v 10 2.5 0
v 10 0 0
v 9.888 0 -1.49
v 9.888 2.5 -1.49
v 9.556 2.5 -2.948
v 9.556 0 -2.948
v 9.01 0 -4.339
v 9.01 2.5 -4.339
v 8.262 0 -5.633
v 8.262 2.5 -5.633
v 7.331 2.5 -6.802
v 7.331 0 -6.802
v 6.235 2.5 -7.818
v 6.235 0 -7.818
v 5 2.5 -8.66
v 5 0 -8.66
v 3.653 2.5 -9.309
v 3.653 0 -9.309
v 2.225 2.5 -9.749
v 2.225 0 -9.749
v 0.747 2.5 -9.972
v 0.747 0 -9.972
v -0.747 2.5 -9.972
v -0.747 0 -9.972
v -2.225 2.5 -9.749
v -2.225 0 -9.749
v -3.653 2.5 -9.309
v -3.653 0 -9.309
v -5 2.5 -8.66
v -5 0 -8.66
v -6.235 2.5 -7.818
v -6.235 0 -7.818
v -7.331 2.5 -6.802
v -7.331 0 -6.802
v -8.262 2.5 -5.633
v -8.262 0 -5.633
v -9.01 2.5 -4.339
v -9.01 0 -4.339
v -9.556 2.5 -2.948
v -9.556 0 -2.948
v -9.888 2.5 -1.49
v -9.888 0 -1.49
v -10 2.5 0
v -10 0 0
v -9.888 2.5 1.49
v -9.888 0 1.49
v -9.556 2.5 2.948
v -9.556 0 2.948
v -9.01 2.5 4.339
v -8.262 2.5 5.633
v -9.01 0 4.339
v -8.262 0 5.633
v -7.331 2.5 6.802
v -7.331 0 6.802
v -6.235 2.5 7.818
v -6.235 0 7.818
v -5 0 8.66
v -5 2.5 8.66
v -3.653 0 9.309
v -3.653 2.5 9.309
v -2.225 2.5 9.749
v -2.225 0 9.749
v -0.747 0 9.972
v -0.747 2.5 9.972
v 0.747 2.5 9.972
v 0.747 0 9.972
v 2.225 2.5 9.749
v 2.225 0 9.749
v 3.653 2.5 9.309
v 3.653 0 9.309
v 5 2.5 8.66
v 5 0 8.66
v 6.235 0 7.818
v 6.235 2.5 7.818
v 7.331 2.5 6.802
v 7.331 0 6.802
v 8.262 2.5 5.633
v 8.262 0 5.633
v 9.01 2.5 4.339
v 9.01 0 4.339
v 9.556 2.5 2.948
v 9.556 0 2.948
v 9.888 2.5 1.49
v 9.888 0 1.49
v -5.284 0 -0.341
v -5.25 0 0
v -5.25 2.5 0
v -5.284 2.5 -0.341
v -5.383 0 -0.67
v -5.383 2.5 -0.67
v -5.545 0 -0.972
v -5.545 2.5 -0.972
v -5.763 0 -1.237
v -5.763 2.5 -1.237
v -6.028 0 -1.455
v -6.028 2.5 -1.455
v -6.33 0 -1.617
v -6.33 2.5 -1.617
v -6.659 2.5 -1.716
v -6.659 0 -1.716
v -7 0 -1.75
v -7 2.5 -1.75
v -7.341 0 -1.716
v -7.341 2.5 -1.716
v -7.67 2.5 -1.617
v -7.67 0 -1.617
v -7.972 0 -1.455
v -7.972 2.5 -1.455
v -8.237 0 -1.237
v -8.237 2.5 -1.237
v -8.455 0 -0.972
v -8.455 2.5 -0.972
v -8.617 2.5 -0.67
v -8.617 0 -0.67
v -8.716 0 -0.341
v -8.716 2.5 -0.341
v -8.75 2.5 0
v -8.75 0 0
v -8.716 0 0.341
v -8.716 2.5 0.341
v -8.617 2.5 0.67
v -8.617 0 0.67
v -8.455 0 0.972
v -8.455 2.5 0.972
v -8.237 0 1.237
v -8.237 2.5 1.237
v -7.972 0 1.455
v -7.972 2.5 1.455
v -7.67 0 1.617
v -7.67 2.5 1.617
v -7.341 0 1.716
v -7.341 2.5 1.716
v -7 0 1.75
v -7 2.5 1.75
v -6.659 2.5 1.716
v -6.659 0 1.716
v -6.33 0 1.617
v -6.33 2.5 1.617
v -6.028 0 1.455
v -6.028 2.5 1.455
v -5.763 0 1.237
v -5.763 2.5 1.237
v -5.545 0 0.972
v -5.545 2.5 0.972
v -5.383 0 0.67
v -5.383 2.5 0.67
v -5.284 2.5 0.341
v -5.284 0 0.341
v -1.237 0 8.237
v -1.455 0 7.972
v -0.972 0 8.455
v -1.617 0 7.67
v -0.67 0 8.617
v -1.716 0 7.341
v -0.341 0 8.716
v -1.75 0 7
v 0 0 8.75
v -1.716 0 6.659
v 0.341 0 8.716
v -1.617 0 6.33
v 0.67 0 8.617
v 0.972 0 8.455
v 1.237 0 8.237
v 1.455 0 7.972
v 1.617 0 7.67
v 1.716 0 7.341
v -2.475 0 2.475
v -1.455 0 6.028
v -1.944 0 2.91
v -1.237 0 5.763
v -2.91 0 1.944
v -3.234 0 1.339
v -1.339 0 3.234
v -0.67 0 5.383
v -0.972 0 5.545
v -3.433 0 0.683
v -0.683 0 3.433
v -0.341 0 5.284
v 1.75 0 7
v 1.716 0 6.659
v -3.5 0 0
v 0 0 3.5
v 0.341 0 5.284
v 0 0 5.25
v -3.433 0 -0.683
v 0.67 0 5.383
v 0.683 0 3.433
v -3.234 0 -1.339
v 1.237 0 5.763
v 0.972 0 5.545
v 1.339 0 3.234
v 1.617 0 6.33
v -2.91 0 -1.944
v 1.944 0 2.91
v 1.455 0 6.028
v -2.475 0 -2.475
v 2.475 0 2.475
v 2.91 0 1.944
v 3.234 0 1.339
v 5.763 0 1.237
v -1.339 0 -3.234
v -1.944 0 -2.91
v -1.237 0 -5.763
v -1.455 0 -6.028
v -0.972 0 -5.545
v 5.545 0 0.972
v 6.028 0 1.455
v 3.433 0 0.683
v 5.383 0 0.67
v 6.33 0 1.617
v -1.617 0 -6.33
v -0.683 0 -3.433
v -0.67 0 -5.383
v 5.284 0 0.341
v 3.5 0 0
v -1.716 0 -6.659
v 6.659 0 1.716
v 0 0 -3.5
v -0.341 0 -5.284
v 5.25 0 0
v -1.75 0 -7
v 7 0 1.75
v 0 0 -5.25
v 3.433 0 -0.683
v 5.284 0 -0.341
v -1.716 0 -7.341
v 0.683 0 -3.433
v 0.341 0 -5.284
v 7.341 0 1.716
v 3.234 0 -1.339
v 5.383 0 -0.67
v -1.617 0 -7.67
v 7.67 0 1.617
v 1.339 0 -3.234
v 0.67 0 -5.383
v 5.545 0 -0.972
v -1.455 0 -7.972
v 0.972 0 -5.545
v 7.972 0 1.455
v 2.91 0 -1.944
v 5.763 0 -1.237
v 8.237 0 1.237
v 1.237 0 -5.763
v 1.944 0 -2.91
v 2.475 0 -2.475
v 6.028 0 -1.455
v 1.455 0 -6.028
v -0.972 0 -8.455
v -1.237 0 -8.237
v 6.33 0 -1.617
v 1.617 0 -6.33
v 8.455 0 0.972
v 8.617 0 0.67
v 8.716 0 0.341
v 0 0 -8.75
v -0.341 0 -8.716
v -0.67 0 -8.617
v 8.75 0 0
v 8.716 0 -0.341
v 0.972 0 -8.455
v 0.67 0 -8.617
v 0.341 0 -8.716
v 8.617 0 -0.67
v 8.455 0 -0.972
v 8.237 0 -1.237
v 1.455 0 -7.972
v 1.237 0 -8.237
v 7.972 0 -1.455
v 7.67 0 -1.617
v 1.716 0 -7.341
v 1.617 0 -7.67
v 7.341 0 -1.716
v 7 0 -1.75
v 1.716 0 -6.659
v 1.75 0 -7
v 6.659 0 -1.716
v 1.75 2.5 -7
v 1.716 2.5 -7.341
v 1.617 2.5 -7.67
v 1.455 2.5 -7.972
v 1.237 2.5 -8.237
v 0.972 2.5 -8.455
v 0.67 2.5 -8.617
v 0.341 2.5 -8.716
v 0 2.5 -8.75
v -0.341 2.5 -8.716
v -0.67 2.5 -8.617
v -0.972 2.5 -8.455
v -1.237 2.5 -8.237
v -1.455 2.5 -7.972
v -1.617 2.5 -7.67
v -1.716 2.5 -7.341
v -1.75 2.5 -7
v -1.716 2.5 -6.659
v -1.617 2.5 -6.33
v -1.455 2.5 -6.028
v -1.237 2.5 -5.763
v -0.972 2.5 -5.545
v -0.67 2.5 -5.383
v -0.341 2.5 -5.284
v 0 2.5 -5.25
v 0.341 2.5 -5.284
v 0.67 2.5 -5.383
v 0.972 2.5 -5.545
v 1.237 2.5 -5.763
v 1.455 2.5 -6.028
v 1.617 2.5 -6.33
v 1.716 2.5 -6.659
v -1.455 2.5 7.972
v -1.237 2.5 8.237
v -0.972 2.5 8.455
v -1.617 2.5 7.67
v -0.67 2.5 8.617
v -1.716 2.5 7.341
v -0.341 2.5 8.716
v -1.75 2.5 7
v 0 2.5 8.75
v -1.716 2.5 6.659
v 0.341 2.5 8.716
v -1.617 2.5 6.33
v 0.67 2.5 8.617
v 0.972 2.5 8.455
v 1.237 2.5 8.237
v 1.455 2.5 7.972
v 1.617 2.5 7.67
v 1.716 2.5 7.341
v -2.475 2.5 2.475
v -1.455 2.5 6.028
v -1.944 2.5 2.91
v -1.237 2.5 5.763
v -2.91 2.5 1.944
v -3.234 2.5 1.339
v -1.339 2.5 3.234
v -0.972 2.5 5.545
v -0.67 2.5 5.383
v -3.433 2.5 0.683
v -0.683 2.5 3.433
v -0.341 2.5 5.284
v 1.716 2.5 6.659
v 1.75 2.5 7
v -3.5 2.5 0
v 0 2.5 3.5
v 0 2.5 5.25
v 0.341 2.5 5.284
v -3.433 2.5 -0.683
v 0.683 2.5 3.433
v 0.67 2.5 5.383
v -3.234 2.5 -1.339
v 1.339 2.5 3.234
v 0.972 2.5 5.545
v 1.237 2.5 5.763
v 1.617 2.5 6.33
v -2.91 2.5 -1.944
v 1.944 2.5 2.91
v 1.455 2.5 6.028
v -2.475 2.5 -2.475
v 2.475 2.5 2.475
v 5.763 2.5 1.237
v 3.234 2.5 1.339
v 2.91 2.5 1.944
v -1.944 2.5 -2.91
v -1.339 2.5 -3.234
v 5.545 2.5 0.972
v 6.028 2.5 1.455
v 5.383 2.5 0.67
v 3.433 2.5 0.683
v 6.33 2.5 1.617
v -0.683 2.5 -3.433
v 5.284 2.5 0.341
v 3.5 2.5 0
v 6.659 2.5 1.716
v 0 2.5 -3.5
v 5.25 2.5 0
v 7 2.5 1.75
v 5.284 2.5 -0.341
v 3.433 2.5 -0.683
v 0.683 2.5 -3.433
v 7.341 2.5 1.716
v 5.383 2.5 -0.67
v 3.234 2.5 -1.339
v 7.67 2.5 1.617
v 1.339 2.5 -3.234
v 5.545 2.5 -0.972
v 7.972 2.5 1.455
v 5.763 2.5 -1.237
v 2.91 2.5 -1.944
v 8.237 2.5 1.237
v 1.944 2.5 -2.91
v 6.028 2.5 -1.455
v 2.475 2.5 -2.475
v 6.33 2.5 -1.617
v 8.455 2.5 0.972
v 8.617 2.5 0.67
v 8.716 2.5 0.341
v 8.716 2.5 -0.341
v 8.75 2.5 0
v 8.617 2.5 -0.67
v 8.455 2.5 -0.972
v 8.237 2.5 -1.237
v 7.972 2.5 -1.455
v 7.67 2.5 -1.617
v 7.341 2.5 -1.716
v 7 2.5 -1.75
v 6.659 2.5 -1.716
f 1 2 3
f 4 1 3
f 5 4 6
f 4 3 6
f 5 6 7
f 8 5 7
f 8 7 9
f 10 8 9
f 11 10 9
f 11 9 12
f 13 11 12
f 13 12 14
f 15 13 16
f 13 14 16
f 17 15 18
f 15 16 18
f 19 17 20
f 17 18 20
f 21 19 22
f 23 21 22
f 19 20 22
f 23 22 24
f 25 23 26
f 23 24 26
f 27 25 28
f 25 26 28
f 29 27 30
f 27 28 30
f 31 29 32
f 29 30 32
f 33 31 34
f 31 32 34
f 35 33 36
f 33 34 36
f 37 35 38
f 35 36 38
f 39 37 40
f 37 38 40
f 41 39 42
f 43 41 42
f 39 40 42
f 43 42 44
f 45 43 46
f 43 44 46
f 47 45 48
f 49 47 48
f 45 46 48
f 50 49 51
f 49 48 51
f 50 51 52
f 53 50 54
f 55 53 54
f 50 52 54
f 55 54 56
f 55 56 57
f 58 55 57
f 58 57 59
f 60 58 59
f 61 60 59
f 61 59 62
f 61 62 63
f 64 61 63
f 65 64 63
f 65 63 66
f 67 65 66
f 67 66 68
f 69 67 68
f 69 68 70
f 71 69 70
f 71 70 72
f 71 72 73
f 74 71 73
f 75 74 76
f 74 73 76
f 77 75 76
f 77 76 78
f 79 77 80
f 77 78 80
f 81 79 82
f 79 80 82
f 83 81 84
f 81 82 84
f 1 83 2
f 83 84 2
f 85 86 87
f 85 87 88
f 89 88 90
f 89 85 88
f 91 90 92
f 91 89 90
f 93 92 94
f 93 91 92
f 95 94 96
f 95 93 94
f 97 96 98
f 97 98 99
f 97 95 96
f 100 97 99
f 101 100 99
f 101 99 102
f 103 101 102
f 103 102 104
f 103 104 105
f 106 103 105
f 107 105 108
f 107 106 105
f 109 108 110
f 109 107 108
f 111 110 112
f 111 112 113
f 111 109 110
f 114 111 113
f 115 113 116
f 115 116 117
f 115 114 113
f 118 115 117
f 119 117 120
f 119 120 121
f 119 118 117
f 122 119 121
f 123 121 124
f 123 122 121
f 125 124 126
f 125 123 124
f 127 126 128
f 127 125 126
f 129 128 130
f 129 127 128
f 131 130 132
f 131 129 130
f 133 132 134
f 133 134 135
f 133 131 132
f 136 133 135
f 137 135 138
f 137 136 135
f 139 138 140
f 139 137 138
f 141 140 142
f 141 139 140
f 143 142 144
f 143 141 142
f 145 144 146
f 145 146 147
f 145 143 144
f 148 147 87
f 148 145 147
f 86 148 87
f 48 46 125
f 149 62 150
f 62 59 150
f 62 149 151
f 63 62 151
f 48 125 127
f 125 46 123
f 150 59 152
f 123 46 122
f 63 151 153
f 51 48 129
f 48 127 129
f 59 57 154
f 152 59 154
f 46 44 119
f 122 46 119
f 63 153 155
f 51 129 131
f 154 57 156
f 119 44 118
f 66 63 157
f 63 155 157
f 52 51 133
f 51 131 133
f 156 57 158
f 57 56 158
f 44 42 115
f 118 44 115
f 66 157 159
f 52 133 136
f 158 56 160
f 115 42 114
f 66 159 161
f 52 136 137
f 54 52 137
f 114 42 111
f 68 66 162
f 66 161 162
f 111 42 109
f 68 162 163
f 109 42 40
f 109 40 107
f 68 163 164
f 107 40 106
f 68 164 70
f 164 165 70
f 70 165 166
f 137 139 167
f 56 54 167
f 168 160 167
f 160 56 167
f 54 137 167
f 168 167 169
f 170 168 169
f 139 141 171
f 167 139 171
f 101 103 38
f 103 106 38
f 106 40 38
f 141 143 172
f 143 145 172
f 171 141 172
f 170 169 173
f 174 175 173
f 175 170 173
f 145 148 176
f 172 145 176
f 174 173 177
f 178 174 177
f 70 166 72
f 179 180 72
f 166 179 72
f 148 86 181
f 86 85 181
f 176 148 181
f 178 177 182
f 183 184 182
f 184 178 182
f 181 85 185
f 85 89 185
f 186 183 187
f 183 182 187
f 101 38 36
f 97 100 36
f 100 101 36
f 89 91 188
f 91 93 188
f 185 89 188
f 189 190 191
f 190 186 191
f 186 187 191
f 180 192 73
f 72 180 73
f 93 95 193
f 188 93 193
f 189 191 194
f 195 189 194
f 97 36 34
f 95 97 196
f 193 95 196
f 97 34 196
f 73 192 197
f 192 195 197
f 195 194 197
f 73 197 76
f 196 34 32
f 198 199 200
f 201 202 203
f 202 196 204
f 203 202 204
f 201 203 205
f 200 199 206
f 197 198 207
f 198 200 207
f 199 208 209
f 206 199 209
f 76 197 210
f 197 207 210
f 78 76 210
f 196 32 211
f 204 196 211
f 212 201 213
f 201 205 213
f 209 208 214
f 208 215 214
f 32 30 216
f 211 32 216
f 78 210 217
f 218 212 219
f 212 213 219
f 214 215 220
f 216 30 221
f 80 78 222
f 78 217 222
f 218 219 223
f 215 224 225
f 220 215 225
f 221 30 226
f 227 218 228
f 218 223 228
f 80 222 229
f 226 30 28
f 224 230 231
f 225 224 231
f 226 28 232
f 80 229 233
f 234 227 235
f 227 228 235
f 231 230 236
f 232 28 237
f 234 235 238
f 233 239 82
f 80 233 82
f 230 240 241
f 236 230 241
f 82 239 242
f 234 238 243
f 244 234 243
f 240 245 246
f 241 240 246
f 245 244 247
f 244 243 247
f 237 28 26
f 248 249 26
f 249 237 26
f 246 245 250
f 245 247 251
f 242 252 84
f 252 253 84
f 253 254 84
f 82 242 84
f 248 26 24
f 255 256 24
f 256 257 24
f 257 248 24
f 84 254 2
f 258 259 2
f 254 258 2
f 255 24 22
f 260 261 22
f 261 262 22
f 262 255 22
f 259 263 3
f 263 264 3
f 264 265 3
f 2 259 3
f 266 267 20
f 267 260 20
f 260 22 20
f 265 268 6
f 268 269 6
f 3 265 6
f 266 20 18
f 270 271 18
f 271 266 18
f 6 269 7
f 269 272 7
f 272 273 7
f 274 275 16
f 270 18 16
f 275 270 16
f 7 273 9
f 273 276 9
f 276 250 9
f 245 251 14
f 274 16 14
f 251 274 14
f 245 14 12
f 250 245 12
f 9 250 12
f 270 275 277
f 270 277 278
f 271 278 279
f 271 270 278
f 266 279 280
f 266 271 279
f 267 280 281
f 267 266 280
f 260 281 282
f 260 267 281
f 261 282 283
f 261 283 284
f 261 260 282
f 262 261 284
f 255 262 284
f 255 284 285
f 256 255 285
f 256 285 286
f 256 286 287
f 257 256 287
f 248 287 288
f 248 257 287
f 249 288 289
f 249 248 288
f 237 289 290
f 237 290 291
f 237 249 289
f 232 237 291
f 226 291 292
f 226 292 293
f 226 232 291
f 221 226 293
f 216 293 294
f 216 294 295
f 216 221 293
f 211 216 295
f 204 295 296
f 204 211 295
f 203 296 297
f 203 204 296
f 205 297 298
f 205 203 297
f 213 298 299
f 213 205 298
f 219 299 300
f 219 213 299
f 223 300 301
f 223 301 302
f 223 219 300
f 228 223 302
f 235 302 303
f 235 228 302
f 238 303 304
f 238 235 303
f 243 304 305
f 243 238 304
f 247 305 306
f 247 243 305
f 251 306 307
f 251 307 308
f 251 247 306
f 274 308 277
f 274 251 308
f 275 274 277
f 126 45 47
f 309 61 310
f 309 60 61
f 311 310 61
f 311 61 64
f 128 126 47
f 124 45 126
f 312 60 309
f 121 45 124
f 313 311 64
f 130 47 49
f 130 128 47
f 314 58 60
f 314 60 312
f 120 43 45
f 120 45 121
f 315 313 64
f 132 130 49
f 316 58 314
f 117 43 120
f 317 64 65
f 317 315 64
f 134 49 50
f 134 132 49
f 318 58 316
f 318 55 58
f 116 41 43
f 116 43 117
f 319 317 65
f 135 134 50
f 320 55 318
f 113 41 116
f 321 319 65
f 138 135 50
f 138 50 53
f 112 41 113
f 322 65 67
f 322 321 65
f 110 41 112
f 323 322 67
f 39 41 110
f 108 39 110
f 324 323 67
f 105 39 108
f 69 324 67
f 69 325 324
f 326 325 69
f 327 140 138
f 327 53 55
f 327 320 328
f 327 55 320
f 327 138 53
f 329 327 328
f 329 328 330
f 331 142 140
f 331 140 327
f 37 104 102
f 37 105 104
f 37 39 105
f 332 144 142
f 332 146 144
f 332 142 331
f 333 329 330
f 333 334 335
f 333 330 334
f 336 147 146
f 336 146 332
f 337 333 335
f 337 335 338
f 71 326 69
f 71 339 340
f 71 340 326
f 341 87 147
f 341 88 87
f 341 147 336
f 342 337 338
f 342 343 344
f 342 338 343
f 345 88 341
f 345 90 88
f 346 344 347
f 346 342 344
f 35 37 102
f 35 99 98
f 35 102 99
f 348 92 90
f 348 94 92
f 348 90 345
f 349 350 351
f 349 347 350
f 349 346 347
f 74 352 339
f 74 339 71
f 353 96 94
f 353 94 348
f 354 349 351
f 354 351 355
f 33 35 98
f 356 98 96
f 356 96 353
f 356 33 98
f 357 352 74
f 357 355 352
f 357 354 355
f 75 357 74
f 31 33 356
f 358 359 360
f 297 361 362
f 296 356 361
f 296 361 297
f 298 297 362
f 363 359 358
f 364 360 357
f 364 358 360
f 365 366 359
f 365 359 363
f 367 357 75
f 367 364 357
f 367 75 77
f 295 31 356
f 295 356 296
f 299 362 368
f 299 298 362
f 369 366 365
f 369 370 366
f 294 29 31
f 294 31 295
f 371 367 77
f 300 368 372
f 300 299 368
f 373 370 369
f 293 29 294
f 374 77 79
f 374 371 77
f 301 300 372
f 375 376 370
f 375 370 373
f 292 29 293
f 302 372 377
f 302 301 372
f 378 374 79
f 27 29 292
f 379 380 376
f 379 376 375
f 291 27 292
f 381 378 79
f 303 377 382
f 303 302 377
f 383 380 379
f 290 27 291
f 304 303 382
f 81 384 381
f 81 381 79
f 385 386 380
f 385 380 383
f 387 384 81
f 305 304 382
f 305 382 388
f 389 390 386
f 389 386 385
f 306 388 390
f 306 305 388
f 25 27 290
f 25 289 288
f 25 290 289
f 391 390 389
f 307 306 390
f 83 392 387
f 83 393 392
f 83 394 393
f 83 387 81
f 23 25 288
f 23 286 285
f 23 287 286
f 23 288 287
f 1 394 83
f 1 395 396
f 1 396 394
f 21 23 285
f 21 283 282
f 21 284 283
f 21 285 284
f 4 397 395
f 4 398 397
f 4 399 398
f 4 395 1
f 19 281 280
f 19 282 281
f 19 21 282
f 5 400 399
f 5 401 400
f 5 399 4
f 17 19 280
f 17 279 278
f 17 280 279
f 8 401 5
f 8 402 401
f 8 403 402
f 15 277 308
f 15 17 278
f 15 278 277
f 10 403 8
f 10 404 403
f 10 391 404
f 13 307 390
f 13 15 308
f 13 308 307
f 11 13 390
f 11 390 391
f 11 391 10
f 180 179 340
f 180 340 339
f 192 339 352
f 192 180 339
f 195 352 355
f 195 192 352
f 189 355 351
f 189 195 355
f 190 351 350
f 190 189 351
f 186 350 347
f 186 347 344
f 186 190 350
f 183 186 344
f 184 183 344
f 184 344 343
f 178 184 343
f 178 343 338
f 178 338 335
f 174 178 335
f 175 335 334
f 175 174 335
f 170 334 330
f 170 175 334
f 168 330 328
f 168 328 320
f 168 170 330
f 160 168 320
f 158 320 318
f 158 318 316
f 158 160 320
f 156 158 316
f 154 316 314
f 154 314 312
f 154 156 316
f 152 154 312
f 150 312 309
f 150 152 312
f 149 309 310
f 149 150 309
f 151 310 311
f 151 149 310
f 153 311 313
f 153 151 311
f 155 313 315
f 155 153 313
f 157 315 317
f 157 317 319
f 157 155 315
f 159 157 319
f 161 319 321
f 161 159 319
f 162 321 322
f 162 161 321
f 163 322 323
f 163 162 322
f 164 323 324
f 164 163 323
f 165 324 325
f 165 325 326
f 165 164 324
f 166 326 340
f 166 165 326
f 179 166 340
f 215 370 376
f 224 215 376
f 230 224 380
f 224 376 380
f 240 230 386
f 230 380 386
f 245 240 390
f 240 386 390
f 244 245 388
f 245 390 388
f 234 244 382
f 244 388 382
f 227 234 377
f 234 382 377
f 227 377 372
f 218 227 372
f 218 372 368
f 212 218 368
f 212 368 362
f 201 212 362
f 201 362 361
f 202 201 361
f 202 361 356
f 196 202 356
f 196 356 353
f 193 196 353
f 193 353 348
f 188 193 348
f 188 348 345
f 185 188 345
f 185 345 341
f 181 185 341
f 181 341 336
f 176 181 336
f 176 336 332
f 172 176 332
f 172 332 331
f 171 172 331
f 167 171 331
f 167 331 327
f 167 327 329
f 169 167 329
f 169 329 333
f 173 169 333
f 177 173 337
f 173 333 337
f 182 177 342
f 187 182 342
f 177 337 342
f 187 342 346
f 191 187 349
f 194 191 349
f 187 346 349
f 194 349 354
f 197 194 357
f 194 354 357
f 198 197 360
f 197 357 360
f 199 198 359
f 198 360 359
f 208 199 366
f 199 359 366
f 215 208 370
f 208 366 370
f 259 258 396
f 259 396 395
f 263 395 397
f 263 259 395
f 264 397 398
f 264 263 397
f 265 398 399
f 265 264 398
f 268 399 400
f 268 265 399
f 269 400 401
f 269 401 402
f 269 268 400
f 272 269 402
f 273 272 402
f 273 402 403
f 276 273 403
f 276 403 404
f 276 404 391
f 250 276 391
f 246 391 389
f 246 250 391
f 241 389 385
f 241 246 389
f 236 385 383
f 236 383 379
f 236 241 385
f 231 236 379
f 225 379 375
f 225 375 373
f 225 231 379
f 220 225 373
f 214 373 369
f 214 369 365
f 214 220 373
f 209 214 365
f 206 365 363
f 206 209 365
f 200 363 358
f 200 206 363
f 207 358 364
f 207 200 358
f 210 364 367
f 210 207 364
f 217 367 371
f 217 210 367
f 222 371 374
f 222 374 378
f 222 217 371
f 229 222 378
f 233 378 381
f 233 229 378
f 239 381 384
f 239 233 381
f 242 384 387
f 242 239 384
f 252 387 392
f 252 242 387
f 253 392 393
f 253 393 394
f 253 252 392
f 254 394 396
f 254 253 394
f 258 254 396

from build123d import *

# Parameters (mm, degrees)
SKETCH_1_R          = 10
SKETCH_1_R_2        = 1.75
EXTRUDE_1_DEPTH     = 2.5
SKETCH_2_R          = 3.5
CUT_EXTRUDE_1_DEPTH = 3.5


with BuildPart() as part:
    # Эскиз1 → Бобышка-Вытянуть1 (new body)
    with BuildSketch(Plane(origin=(0, 0, 0), x_dir=(1, 0, 0), z_dir=(0, 1, 0))):
        Circle(SKETCH_1_R)
        with Locations((-7, 0)):
            Circle(SKETCH_1_R_2, mode=Mode.SUBTRACT)
        with Locations((0, 7)):
            Circle(SKETCH_1_R_2, mode=Mode.SUBTRACT)
        with Locations((7, 0)):
            Circle(SKETCH_1_R_2, mode=Mode.SUBTRACT)
        with Locations((0, -7)):
            Circle(SKETCH_1_R_2, mode=Mode.SUBTRACT)
    extrude(amount=EXTRUDE_1_DEPTH)

    # Эскиз2 → Вырез-Вытянуть1 (cut, through all)
    with BuildSketch(Plane(origin=(0, 2.5, 0), x_dir=(1, 0, 0), z_dir=(0, 1, 0))):
        Circle(SKETCH_2_R)
    extrude(amount=-CUT_EXTRUDE_1_DEPTH, mode=Mode.SUBTRACT)


solid = part.part
